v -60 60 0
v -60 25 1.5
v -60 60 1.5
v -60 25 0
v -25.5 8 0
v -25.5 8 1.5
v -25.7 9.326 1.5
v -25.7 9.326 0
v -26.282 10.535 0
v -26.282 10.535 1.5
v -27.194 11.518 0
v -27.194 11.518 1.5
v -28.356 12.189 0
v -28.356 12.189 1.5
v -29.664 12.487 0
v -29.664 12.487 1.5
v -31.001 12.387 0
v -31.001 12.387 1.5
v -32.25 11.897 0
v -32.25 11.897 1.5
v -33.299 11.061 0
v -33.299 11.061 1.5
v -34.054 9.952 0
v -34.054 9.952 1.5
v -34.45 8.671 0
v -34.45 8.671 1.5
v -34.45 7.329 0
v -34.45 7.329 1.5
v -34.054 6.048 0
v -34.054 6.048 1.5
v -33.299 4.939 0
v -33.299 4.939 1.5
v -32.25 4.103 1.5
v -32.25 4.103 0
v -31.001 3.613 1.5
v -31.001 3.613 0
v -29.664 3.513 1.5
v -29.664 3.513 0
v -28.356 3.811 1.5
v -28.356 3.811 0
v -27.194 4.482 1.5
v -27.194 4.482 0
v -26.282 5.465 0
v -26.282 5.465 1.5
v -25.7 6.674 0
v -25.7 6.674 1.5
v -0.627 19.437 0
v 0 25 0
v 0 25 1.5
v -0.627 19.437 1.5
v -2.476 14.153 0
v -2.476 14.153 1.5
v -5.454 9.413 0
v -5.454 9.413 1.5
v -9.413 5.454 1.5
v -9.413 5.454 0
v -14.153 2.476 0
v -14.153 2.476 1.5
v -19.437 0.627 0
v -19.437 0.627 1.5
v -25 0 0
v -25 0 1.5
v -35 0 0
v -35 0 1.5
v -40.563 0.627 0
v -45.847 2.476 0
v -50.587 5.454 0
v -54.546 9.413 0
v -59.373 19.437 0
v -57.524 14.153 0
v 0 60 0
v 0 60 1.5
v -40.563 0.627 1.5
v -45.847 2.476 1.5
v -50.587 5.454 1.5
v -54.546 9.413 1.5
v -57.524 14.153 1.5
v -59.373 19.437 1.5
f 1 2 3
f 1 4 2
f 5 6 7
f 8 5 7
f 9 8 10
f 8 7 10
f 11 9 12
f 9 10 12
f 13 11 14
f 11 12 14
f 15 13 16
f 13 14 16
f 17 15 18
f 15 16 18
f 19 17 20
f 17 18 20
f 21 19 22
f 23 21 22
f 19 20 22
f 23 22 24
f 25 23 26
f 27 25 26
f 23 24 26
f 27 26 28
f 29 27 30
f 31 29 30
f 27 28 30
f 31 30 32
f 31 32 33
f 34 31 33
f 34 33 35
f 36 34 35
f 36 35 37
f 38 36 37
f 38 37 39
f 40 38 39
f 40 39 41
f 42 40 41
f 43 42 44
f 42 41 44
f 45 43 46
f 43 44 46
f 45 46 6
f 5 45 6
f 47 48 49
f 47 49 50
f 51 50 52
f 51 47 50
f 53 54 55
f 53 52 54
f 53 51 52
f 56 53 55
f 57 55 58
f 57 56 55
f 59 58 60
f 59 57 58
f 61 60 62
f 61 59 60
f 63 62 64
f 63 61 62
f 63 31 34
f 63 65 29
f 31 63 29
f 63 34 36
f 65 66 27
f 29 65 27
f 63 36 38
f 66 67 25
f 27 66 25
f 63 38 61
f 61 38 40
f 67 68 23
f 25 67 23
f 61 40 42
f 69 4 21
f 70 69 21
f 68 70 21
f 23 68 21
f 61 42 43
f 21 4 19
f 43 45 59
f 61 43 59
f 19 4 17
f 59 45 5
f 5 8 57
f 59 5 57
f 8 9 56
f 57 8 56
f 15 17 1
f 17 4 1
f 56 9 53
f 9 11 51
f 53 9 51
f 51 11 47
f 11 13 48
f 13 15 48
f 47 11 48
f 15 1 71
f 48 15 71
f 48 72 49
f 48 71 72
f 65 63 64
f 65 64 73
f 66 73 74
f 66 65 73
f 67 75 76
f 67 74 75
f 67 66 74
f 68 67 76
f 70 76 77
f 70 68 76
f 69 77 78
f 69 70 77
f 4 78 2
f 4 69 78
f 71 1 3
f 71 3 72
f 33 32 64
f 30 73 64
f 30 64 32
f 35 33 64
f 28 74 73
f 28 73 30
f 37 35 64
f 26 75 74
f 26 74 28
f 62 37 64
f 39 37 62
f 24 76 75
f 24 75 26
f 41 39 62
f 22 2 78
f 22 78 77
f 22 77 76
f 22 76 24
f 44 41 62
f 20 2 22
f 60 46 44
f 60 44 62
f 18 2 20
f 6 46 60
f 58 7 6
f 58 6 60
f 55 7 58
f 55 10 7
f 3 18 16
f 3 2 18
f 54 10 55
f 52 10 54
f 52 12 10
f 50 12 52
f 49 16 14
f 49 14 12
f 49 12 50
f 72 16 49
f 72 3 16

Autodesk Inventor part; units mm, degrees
ref_plane "YZ Plane" through (0, 0, 0) normal (1, 0, 0) x (0, 1, 0)
ref_plane "XZ Plane" through (0, 0, 0) normal (0, 1, 0) x (-1, 0, 0)
ref_plane "XY Plane" through (0, 0, 0) normal (0, 0, 1) x (1, 0, 0)
sketch "Sketch1" plane through (0, 0, 0) normal (0, 0, 1) x (1, 0, 0)
  line L0 (-25, 0) -> (-35, 0)
  line L1 (-60, 25) -> (-60, 60)
  line L2 (-60, 60) -> (0, 60)
  line L3 (0, 60) -> (0, 25)
  arc A0 (-25, 0) -> (0, 25) centre (-25, 25) ccw
  arc A1 (-60, 25) -> (-35, 0) centre (-35, 25) ccw
  point P0 (0, 0)
  point P1 (-60, 0)
  dimension "d0" = 60
  dimension "d1" = 60
  dimension "d9" = 25
extrude "Extrusion1" add sketch "Sketch1" along normal blind 1.5
sketch "Sketch2" plane through (0, 0, 1.5) normal (0, 0, 1) x (1, 0, 0)
  line L0 (0, 0) -> (-30, 0)
  line L1 (-35, 0) -> (0, 0) projected
  line L2 (-30, 3.5) -> (-30, 8)
  circle A0 centre (-30, 8) radius 4.5
  point P0 (-60, 0)
  dimension "d6" = 9
  dimension "d4" = 30
  dimension "d5" = 8
extrude "Extrusion2" cut sketch "Sketch2" against normal blind 1.5
properties part number "clamp"
